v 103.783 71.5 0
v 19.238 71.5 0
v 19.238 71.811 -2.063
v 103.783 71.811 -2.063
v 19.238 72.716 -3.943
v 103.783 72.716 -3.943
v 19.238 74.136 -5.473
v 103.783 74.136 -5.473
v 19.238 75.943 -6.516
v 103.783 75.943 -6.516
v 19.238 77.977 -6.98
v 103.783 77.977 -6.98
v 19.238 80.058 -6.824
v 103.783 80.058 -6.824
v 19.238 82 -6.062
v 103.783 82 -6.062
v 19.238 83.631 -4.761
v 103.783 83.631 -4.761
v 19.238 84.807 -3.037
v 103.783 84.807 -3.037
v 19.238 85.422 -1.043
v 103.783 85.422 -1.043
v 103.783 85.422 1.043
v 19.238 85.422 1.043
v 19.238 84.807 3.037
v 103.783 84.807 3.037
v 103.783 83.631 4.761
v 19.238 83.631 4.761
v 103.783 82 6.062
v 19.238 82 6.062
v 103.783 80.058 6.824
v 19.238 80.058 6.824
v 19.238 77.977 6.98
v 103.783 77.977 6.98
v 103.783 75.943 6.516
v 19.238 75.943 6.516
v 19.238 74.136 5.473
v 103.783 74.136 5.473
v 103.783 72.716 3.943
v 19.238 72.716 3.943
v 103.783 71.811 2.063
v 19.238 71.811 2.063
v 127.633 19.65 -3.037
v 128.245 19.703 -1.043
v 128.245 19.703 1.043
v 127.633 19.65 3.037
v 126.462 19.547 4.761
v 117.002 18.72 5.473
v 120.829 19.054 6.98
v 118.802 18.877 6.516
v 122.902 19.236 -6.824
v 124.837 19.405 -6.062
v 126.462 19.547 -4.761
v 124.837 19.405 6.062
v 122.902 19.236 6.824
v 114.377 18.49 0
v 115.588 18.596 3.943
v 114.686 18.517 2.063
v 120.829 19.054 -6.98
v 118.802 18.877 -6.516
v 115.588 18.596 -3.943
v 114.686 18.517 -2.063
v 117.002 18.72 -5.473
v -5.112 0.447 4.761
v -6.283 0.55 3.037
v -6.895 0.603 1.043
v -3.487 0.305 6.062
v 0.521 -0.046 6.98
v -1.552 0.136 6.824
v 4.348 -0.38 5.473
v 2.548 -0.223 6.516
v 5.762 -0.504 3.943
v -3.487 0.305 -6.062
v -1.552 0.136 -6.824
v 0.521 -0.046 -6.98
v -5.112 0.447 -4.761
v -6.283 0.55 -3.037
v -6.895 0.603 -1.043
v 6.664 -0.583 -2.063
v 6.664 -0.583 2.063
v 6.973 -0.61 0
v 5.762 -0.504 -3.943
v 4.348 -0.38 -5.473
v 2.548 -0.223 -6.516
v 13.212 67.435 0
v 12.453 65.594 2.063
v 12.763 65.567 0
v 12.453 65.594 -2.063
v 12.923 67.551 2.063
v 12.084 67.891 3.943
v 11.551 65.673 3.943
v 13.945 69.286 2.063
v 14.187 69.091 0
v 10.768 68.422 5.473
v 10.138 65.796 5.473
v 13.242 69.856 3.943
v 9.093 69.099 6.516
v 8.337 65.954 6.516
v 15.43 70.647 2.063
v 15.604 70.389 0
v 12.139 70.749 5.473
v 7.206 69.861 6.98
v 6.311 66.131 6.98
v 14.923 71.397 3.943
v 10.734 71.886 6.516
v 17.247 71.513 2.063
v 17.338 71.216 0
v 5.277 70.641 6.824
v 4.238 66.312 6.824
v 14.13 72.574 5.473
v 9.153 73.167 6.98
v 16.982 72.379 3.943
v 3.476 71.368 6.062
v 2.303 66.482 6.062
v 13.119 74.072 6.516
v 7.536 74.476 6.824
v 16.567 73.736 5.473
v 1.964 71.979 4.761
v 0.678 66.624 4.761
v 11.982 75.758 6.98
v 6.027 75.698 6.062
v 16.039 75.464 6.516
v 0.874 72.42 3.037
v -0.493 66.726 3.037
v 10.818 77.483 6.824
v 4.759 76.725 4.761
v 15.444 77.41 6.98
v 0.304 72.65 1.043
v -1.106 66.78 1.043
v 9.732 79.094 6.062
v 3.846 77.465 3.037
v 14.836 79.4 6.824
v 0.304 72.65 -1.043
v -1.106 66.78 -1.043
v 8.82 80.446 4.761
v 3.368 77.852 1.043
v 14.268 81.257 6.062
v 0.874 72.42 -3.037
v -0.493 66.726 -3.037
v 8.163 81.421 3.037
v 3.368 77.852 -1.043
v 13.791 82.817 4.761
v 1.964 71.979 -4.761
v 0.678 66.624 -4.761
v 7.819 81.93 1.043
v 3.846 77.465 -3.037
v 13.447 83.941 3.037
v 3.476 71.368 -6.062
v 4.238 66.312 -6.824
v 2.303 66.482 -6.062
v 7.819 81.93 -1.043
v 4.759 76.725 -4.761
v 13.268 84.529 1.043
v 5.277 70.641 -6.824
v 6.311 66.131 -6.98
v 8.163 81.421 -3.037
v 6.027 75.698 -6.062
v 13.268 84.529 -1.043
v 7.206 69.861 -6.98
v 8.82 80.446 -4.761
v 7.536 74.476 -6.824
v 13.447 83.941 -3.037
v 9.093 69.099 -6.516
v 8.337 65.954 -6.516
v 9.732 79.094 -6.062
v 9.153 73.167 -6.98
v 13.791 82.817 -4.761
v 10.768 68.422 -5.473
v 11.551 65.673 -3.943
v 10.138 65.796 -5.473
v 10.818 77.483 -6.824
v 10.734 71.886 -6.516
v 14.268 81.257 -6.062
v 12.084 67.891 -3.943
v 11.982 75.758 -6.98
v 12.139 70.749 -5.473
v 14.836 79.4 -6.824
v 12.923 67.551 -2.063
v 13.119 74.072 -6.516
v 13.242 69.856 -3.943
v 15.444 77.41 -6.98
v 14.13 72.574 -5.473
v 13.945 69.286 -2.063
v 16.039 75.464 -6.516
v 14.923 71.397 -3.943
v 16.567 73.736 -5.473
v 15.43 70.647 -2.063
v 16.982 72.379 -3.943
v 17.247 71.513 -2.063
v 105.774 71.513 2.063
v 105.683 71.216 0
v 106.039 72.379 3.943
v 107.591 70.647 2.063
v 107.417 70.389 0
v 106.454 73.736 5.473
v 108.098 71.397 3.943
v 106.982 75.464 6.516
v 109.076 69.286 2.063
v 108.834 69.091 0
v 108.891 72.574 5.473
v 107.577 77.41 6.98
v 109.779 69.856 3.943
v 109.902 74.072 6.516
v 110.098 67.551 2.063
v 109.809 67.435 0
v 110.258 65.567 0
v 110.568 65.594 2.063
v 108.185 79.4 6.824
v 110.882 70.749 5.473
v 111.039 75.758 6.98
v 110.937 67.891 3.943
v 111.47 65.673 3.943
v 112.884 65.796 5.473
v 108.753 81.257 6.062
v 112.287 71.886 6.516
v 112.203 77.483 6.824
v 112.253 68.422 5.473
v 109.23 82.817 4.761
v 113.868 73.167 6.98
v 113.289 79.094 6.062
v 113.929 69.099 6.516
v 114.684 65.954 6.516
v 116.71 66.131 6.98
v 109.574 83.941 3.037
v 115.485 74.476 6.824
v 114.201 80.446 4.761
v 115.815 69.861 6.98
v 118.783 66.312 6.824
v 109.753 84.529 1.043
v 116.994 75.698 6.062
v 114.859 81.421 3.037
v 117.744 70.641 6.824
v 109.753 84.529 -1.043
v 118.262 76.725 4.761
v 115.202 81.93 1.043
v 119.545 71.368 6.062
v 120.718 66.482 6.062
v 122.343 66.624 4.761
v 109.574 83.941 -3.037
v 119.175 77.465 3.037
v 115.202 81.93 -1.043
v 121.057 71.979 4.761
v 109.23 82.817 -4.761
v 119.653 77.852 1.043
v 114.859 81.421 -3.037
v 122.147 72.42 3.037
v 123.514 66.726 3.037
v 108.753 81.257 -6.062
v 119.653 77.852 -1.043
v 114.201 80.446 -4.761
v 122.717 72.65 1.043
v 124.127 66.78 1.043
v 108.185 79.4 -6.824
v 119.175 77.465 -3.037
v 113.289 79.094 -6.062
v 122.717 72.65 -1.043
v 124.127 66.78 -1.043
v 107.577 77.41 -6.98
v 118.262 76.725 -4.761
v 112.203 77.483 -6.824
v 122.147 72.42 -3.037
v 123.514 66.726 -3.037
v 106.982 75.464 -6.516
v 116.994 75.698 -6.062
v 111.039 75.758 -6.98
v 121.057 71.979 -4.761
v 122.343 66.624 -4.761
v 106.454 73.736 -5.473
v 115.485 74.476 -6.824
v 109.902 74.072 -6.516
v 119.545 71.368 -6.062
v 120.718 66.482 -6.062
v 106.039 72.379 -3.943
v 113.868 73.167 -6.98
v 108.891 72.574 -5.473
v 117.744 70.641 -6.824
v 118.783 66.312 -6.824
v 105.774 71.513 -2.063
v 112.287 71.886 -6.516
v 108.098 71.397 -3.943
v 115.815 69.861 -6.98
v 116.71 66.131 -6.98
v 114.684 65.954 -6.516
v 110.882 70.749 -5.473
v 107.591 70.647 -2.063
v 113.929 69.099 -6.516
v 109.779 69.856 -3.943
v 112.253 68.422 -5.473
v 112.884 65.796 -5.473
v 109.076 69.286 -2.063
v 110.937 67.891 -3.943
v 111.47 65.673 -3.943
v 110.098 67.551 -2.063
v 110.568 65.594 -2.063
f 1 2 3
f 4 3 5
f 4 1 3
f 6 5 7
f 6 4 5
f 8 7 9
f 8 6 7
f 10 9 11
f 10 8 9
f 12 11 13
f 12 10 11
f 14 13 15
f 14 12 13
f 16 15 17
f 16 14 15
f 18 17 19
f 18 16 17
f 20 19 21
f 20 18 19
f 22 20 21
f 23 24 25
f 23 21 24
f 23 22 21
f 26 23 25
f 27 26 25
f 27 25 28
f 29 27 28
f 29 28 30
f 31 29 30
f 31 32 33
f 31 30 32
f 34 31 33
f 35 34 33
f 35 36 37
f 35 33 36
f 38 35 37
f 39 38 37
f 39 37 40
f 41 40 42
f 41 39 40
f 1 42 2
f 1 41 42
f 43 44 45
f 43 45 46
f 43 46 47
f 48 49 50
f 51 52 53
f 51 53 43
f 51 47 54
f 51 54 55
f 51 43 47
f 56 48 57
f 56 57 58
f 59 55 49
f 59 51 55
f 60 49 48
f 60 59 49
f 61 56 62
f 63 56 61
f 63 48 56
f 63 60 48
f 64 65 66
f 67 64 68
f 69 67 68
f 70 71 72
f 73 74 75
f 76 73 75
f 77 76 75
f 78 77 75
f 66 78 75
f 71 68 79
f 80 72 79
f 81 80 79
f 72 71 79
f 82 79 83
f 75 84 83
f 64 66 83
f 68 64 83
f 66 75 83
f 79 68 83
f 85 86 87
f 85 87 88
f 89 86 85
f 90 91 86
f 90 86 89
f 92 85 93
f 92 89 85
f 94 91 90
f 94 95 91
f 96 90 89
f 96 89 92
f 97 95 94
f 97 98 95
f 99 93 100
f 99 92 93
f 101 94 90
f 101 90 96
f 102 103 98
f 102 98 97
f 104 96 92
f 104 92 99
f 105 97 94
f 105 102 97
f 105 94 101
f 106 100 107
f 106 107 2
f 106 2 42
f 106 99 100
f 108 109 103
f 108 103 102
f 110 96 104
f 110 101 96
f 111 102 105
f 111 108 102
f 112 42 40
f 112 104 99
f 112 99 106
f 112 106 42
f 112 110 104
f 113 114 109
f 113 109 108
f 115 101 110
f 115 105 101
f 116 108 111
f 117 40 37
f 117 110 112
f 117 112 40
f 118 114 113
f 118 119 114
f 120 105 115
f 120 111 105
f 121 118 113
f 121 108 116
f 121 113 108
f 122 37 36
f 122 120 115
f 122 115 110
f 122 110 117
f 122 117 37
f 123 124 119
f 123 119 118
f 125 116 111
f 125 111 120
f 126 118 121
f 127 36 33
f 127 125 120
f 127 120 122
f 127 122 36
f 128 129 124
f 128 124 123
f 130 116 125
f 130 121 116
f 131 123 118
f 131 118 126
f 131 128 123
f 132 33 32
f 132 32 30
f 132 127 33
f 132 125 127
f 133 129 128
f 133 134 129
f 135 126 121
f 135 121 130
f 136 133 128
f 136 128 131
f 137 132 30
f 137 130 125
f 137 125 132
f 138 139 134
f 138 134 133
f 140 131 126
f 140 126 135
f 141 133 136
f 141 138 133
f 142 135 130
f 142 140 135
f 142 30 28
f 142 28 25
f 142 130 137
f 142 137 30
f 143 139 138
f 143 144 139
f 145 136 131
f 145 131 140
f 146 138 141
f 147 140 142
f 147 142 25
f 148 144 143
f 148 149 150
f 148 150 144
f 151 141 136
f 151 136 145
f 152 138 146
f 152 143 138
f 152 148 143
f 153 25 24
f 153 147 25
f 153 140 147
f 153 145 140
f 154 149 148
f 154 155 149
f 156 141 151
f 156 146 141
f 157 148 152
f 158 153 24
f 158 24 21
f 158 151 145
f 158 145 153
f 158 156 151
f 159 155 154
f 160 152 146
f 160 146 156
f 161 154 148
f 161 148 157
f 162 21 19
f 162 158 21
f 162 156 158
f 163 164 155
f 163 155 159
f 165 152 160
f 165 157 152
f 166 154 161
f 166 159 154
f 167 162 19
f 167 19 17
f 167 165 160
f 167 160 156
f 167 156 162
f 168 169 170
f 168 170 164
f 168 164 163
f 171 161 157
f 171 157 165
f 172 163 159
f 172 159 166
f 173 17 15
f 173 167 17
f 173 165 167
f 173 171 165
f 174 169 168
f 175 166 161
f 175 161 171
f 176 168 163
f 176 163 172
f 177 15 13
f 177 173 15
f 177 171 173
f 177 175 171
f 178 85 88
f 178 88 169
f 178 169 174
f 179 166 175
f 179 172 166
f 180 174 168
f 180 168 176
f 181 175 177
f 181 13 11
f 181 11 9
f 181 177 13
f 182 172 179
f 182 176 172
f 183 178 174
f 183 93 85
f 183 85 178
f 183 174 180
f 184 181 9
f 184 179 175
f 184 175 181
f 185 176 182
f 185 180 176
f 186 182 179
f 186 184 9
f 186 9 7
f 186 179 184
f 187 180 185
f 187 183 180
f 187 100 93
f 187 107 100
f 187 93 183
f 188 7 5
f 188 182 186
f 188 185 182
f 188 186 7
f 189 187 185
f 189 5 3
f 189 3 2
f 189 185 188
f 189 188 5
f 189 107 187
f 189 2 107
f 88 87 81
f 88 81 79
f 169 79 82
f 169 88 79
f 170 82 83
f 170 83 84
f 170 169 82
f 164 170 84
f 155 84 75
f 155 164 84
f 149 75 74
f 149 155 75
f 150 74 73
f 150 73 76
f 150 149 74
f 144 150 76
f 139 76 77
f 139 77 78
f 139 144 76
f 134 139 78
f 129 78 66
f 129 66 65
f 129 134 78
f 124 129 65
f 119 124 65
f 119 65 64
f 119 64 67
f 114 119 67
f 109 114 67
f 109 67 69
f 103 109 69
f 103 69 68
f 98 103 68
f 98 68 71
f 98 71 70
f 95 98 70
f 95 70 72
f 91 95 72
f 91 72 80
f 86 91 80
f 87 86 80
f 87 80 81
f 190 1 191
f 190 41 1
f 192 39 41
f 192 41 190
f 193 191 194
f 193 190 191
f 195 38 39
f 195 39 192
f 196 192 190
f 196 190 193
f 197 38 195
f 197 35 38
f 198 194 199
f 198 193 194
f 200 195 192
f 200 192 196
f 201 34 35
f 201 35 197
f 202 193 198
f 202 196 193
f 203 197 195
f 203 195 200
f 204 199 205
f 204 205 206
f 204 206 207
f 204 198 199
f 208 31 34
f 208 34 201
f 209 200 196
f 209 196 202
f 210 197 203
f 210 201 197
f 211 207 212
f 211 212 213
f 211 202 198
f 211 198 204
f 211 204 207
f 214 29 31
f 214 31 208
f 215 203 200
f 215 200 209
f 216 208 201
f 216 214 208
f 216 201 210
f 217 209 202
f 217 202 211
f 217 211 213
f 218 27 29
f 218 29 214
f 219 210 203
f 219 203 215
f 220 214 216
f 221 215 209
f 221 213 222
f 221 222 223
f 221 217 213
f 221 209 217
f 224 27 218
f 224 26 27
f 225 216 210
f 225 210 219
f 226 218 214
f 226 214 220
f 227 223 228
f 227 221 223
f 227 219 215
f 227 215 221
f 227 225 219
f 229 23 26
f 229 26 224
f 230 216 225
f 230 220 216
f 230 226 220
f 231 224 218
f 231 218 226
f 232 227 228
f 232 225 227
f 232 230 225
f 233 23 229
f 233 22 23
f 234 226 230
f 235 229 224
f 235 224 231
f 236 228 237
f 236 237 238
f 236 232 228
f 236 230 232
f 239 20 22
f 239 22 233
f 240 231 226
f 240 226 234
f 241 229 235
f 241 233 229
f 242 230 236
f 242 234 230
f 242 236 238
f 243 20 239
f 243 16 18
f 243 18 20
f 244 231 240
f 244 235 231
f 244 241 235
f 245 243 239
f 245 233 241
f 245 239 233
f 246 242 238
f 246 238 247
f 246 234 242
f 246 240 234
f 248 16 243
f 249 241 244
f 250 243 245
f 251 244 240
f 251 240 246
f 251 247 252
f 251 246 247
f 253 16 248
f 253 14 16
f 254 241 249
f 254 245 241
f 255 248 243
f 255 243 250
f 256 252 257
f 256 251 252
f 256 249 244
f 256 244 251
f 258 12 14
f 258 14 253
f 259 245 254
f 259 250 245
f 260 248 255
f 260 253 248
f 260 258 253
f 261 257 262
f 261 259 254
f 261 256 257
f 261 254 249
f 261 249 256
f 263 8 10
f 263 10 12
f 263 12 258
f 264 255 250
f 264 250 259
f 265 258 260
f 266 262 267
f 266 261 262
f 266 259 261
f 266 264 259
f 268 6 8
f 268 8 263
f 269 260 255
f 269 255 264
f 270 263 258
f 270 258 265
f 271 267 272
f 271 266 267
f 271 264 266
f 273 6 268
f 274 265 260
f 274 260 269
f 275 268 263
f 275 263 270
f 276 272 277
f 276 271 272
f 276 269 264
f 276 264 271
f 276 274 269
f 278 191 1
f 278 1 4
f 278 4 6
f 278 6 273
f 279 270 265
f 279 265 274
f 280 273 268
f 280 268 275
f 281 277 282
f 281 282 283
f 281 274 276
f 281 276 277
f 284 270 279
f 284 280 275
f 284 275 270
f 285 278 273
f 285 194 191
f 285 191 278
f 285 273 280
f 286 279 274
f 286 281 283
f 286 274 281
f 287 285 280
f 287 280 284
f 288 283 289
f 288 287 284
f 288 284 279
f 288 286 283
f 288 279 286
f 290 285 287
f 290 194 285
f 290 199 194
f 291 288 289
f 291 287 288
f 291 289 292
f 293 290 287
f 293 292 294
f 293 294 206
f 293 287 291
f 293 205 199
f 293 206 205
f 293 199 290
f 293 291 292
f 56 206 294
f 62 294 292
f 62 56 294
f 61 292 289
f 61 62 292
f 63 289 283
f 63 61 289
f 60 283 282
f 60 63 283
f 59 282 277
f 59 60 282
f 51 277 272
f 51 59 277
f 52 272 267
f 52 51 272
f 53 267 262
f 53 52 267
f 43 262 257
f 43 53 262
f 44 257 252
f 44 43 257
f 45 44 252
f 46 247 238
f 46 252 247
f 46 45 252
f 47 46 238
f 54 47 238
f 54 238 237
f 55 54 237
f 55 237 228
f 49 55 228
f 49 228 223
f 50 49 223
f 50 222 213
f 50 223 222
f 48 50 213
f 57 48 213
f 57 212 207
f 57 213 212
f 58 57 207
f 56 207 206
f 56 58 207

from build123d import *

# Parameters (mm, degrees)
PATH_R = 7


with BuildPart() as part:
    # Cam Handle: sweep along a path in Circle
    with BuildLine(Plane.XY) as cam_handle_path:
        Line((0, 0), (5.789702512, 66.176602527))
        ThreePointArc((5.789702512, 66.176602527), (10.117863133, 74.953244047), (19.238330936, 78.5))
        Line((19.238330936, 78.5), (103.782702537, 78.5))
        ThreePointArc((103.782702537, 78.5), (112.90317034, 74.953244047), (117.231330962, 66.176602527))
        Line((117.231330962, 66.176602527), (121.35, 19.1))
    # Path → Cam Handle (sweep)
    with BuildSketch(Plane(origin=(0, 0, 0), x_dir=(0.9961946980917455, -0.08715574274765839, 0), z_dir=(0.0871557427476584, 0.9961946980917457, 0))):
        Circle(PATH_R)
    sweep(path=cam_handle_path.line)


solid = part.part
